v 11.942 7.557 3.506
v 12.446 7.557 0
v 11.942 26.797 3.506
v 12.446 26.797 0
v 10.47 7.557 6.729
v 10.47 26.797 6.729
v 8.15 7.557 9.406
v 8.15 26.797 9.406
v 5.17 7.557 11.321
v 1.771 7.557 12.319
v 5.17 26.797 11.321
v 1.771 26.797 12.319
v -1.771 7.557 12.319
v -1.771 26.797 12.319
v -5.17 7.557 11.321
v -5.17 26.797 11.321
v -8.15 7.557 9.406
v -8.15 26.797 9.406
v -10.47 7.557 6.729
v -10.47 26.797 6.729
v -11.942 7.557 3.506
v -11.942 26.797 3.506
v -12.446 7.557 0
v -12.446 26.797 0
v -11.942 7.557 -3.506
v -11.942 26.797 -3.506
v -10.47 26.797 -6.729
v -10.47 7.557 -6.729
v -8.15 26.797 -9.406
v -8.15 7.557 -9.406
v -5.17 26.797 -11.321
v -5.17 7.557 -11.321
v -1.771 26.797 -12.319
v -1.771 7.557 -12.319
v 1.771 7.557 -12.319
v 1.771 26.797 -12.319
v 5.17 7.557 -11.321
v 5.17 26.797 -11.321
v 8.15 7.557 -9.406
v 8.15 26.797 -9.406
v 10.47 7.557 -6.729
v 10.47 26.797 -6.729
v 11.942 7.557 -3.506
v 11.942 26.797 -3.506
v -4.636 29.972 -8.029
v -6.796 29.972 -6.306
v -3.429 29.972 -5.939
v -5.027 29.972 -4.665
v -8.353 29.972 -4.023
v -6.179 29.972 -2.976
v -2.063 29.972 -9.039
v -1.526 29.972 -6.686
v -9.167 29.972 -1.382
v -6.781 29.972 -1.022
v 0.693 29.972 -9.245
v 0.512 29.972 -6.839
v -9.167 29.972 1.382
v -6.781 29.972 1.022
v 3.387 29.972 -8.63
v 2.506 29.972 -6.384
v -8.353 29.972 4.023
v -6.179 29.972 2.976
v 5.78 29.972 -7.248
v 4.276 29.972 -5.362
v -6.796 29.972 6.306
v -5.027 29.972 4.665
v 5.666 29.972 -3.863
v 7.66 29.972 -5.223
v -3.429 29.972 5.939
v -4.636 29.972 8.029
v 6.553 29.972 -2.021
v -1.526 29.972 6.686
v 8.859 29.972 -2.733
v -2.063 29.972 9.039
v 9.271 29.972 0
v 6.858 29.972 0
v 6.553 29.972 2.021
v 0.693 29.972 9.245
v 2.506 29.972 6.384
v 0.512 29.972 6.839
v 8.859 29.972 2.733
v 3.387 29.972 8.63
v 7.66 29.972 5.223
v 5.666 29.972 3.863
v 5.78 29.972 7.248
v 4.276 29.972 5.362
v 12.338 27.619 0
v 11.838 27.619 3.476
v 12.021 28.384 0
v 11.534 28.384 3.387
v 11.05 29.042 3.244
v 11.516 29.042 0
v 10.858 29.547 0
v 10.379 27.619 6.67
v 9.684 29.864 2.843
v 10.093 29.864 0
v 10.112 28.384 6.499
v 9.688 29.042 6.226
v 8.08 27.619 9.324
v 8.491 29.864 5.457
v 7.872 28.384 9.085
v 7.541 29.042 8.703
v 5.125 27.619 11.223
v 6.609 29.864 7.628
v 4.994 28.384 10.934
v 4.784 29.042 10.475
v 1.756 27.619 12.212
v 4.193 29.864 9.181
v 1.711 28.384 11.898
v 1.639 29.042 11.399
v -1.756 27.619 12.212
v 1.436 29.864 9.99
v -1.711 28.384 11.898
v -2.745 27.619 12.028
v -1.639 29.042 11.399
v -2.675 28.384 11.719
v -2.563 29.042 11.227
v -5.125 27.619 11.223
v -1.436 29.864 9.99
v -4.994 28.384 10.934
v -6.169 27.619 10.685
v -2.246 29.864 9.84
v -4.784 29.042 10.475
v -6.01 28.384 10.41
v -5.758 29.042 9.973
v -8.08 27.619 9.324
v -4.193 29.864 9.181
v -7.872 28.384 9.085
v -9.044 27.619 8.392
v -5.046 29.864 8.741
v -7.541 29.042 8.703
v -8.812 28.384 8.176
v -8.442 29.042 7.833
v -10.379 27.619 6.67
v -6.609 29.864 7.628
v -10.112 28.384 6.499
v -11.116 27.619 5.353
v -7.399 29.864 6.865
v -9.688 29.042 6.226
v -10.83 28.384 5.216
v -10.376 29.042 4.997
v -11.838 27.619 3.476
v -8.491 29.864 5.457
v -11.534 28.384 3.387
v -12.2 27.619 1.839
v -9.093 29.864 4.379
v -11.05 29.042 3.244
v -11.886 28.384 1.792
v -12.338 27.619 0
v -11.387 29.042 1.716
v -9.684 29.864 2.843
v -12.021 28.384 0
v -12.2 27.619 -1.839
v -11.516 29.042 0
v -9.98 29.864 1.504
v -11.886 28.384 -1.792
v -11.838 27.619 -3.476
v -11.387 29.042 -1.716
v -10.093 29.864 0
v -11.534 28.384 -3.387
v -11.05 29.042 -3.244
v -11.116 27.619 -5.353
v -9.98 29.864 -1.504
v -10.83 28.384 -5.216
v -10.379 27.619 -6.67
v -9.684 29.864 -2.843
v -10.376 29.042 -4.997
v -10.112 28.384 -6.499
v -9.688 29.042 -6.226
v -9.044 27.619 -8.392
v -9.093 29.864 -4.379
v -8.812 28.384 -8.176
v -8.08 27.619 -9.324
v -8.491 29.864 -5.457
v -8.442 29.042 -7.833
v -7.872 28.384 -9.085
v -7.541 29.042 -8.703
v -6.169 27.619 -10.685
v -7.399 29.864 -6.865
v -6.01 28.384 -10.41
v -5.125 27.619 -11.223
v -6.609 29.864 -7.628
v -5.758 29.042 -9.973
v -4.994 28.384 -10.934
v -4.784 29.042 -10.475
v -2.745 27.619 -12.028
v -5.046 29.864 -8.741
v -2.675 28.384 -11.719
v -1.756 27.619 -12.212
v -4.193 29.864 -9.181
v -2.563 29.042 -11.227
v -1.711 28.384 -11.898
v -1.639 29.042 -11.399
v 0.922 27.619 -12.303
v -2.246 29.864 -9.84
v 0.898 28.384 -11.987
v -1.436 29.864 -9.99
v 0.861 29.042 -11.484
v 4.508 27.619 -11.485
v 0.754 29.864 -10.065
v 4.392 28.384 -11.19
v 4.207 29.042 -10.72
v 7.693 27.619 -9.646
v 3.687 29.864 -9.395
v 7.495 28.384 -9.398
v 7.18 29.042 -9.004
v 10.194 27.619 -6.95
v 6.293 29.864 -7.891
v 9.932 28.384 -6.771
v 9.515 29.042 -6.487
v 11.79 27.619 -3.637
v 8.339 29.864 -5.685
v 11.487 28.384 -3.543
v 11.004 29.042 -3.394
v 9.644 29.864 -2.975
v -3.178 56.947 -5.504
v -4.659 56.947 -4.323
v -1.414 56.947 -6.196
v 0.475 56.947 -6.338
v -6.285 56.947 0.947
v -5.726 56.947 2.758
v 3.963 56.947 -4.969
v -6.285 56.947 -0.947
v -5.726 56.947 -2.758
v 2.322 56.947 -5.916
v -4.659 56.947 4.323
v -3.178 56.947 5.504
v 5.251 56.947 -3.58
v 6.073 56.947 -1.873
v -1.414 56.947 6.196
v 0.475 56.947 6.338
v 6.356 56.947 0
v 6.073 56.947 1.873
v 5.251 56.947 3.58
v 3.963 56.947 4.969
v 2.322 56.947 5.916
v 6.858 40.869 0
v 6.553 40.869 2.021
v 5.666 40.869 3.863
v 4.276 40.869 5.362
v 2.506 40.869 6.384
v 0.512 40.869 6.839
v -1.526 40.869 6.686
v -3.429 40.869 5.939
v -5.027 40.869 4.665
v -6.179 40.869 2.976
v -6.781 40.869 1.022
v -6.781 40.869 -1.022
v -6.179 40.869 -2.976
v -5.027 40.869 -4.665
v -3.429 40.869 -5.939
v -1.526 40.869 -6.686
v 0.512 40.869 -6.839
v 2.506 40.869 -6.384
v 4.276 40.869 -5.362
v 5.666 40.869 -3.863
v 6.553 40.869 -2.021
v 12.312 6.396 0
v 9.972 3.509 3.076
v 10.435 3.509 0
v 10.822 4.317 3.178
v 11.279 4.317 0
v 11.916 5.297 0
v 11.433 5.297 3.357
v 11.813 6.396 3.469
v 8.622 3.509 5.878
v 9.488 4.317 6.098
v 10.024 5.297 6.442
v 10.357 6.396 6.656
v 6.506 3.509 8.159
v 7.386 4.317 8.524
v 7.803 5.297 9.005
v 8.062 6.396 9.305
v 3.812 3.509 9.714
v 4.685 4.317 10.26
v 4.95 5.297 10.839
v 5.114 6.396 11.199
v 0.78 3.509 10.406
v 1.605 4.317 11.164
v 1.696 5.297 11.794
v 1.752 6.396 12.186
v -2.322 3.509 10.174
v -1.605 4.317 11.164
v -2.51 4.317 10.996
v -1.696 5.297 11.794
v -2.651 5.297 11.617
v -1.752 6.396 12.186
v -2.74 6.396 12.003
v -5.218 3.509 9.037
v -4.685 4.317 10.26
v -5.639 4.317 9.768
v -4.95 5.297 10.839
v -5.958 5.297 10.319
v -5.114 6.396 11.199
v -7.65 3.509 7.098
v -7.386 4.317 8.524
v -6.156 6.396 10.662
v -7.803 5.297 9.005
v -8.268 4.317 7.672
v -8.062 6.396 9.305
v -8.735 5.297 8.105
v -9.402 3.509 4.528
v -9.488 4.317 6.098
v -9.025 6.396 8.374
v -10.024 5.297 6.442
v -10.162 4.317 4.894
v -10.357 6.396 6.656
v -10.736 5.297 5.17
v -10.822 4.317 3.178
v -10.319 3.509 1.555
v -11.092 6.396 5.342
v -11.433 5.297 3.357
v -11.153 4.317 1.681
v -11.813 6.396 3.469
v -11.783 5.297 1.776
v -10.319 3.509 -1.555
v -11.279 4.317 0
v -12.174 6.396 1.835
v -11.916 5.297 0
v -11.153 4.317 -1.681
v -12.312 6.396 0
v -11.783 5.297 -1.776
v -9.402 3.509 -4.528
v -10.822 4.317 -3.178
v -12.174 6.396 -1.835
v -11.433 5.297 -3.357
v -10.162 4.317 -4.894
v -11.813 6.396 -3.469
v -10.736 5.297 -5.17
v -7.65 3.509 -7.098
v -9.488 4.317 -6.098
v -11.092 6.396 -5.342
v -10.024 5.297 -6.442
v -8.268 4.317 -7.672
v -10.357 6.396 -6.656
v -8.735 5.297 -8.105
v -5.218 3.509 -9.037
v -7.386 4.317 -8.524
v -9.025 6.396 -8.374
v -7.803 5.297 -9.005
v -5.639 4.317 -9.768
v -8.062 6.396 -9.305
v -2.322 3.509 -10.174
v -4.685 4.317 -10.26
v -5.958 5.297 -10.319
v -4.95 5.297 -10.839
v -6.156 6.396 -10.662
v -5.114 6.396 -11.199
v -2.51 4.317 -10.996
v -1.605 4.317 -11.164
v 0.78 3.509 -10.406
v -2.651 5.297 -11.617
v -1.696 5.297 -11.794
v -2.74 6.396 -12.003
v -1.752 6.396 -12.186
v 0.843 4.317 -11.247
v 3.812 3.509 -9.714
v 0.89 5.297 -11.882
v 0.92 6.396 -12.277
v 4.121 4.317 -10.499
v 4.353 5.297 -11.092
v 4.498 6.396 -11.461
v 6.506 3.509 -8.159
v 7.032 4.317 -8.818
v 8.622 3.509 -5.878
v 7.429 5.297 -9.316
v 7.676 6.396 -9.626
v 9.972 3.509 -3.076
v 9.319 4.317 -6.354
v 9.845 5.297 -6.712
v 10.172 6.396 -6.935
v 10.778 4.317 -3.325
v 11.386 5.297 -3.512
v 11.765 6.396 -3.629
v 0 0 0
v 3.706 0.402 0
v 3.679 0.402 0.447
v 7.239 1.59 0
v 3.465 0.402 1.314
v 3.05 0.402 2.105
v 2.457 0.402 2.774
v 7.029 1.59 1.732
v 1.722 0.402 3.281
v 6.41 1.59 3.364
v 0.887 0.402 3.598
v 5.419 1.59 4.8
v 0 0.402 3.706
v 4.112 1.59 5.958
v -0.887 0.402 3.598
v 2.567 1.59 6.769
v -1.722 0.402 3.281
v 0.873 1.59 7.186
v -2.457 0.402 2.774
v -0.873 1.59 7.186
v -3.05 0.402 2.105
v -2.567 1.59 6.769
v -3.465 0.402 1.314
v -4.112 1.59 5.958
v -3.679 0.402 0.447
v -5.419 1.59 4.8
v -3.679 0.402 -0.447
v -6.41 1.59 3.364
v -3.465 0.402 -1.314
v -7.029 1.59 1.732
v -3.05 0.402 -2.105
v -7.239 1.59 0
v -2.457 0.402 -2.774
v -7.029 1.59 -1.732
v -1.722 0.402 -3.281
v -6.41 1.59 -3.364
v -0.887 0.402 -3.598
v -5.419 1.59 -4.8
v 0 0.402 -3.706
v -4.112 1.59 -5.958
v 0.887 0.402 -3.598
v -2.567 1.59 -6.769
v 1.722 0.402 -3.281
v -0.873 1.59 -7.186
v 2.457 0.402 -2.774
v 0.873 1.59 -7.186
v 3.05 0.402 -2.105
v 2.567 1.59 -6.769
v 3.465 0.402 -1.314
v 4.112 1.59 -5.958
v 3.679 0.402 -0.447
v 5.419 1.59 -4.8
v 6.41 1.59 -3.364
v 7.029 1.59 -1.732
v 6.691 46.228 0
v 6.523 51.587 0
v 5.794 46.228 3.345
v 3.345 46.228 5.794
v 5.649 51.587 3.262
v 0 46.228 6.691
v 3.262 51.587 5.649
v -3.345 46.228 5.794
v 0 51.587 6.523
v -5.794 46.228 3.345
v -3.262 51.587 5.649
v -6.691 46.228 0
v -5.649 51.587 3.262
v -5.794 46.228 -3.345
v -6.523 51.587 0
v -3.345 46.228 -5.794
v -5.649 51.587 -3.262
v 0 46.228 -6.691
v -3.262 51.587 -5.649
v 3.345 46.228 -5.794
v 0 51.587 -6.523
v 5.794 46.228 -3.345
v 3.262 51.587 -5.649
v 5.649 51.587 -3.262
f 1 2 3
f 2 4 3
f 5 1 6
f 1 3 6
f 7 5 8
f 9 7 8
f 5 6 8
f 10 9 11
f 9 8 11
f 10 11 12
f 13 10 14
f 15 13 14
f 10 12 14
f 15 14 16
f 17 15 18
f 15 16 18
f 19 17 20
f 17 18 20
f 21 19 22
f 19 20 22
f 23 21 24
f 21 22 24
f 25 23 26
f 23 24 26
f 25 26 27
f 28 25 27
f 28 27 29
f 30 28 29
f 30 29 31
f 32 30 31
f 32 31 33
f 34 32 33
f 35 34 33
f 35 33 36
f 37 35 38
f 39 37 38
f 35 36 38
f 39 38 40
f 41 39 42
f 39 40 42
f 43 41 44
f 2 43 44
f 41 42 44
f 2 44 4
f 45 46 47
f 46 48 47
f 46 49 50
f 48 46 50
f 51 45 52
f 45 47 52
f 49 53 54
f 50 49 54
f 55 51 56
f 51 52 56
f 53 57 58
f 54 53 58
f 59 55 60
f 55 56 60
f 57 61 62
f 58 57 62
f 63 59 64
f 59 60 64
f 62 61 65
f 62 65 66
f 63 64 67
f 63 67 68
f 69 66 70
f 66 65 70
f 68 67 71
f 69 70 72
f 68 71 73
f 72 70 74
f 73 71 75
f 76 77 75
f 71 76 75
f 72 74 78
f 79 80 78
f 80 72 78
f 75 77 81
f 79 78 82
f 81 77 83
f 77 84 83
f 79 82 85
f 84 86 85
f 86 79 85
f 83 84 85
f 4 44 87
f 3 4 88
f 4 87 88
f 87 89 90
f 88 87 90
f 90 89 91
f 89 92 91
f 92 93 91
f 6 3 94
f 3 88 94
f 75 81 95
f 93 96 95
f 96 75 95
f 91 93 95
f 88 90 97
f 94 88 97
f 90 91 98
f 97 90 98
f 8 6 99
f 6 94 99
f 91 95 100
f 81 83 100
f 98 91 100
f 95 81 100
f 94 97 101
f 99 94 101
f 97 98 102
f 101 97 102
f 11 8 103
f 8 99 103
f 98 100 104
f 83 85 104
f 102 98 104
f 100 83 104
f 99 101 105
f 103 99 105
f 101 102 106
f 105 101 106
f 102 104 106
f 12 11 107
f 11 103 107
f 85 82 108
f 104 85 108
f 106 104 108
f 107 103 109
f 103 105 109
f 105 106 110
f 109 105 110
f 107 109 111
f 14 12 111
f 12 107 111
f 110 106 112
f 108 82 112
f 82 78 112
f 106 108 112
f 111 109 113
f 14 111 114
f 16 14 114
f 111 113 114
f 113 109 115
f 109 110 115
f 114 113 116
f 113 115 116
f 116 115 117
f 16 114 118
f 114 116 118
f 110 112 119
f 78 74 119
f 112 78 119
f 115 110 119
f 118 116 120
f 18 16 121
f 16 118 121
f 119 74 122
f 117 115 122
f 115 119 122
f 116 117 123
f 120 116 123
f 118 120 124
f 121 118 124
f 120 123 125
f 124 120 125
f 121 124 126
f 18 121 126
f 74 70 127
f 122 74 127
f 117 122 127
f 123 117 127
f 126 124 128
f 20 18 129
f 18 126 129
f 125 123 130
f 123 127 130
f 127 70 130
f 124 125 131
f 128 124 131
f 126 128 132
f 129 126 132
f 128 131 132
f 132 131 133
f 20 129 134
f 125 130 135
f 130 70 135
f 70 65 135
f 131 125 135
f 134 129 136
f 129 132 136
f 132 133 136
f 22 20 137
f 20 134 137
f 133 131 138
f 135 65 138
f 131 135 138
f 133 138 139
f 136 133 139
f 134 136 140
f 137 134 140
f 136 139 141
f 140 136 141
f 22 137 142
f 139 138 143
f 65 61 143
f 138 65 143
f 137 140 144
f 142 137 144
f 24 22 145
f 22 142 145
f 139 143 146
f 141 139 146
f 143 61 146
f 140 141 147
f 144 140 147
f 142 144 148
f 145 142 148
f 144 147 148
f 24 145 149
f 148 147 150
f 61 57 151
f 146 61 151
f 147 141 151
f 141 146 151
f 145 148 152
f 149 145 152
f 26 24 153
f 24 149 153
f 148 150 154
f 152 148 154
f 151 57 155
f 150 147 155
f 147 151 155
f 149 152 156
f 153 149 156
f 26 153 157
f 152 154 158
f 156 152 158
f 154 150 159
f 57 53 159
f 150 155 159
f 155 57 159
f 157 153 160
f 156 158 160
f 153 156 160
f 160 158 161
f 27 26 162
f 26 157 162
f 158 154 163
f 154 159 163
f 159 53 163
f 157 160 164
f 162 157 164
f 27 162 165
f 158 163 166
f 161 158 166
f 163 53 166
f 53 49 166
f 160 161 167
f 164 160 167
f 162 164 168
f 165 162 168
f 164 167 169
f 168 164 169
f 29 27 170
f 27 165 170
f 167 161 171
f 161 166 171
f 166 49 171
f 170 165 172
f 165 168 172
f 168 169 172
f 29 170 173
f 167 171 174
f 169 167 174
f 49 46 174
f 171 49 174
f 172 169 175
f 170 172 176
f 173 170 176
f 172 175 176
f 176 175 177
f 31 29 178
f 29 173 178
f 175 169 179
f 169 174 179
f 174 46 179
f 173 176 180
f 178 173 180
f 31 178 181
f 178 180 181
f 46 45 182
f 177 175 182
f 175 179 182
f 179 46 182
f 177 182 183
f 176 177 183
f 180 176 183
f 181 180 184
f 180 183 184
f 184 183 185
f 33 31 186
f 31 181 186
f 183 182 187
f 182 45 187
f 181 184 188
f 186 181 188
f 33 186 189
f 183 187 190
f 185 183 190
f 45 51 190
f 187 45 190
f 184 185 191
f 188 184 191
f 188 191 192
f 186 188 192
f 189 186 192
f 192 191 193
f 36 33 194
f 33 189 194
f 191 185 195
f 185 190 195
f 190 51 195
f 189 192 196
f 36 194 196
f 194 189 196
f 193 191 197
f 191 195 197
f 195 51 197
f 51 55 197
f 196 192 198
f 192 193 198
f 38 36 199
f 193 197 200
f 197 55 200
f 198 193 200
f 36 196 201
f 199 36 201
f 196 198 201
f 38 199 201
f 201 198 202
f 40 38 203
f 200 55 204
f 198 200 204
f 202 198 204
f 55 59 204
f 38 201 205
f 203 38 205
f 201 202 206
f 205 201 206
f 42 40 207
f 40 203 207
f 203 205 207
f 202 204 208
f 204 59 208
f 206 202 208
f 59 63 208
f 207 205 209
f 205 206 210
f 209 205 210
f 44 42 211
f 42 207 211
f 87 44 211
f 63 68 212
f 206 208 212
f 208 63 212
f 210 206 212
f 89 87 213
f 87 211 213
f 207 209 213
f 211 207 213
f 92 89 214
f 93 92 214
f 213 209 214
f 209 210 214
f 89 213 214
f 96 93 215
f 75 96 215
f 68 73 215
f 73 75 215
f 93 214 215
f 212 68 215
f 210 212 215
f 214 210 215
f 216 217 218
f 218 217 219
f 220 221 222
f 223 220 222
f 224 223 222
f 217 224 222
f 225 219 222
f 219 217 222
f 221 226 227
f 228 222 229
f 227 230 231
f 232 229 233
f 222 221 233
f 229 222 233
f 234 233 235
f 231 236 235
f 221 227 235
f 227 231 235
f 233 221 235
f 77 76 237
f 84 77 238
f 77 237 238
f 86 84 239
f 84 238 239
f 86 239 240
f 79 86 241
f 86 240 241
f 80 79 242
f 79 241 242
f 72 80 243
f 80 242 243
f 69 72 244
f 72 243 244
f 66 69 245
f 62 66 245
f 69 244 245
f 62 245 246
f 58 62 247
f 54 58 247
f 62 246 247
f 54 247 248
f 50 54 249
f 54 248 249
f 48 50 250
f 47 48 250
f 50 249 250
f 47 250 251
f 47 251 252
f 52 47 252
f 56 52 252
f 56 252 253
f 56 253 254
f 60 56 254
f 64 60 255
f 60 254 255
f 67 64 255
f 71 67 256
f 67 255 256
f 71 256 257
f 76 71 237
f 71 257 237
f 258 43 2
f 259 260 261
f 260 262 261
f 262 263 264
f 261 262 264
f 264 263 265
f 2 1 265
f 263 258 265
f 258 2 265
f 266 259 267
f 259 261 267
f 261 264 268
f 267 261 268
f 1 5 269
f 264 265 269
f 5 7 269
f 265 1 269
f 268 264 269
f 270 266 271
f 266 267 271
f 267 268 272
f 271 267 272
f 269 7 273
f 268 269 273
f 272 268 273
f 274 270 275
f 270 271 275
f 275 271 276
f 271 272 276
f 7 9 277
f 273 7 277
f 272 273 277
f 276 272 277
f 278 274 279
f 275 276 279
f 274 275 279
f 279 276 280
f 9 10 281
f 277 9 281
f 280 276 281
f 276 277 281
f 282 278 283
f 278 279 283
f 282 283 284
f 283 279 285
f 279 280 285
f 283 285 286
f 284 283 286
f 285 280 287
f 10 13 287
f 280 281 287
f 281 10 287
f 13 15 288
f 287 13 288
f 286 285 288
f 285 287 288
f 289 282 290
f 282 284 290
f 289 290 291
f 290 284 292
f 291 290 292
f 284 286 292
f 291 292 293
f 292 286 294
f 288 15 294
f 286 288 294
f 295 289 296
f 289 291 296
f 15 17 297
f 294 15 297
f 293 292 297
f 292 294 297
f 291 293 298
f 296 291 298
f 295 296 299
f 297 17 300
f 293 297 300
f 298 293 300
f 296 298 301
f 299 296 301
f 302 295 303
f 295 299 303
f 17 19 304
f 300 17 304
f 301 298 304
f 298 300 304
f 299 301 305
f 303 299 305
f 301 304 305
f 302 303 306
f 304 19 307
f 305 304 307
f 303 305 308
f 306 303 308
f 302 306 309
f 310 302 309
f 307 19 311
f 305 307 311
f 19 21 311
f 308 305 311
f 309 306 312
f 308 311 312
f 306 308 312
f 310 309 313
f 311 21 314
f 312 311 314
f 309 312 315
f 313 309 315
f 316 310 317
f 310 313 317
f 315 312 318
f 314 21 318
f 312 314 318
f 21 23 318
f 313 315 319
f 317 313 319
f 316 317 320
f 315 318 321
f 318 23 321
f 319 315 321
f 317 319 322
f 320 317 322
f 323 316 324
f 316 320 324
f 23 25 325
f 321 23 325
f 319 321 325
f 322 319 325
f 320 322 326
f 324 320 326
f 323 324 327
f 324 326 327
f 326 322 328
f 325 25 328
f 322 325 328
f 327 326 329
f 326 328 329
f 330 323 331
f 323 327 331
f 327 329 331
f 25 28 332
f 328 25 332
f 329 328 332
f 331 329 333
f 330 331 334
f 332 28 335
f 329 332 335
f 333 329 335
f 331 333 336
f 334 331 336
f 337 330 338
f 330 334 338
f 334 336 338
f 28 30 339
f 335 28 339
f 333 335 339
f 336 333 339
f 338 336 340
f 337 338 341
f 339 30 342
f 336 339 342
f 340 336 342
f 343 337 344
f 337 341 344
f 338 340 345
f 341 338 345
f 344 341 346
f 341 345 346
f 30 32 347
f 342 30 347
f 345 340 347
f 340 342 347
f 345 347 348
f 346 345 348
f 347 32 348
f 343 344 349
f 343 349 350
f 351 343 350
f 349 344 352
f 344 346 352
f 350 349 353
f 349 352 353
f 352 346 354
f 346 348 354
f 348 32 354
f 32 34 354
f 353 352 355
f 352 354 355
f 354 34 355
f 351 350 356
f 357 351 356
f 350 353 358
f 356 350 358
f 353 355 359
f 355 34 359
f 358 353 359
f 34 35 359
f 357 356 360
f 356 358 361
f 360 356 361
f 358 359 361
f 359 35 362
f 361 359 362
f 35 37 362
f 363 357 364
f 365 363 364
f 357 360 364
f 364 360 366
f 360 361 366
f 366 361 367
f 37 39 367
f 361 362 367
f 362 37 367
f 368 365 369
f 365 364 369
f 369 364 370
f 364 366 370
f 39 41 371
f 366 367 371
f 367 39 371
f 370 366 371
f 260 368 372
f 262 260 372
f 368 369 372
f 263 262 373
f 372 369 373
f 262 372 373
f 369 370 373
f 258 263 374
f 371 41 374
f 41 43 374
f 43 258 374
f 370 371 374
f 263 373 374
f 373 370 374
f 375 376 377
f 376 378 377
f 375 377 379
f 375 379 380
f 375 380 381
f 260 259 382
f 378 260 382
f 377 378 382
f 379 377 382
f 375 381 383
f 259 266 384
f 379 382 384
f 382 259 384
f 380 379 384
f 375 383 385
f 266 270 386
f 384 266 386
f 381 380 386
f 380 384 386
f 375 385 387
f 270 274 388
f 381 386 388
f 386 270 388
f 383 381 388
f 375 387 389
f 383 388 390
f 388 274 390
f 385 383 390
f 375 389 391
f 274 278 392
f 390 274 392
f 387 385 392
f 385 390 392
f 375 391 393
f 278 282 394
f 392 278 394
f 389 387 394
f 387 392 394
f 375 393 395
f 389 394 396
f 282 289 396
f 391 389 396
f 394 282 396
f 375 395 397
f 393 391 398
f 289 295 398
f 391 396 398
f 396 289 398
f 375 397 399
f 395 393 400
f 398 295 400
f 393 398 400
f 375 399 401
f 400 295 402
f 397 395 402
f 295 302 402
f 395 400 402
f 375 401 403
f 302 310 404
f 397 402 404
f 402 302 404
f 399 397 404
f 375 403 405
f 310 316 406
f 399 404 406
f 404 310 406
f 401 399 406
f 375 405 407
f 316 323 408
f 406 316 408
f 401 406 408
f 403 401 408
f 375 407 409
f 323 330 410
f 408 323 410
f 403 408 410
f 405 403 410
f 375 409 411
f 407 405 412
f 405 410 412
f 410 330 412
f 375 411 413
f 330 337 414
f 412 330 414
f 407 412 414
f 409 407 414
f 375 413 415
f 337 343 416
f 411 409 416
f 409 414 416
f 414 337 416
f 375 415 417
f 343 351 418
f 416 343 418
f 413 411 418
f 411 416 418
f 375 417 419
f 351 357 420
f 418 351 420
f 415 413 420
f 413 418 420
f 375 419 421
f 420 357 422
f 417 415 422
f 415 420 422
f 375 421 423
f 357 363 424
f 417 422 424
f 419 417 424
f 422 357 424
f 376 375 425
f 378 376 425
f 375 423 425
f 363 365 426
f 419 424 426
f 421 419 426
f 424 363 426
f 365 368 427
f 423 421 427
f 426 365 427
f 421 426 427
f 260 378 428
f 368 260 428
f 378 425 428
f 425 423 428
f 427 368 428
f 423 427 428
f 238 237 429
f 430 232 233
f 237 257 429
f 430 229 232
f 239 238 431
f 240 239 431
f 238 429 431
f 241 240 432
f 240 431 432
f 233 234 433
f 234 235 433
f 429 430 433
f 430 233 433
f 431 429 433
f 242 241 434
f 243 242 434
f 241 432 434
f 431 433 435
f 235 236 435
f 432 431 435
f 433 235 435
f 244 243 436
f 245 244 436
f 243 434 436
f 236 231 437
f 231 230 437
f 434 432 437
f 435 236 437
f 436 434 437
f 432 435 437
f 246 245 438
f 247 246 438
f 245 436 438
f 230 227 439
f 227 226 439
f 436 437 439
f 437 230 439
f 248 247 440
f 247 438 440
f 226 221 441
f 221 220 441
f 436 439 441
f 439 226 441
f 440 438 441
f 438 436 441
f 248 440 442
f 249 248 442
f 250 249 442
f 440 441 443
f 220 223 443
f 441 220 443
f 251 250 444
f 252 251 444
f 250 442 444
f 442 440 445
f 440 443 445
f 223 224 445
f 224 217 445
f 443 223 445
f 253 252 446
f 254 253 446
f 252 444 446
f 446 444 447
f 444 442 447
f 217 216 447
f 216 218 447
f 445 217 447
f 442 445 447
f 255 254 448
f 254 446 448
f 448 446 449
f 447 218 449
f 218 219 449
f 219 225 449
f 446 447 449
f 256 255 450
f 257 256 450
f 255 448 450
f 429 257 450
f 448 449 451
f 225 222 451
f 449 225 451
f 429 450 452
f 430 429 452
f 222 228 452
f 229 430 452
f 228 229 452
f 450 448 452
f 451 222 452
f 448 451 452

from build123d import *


with BuildPart() as part:
    # Sketch1 → Revolve1 (revolve)
    with BuildSketch(Plane.XY):
        with BuildLine():
            Line((12.446, 7.556707519), (12.446, 26.797))
            ThreePointArc((12.446, 26.797), (11.51606403, 29.04206403), (9.271, 29.972))
            Line((9.271, 29.972), (6.858, 29.972))
            Line((6.858, 29.972), (6.858, 40.8686))
            Line((6.858, 40.8686), (6.355531141, 56.9468))
            Line((6.355531141, 56.9468), (0, 56.9468))
            Line((0, 56.9468), (0, 0))
            ThreePointArc((0, 0), (5.504622181, 0.900649456), (10.435166667, 3.508668985))
            ThreePointArc((10.435166667, 3.508668985), (11.915602547, 5.296725955), (12.446, 7.556707519))
        make_face()
    revolve(axis=Axis((0, 56.9468, 0), (0, -1, 0)))


solid = part.part
